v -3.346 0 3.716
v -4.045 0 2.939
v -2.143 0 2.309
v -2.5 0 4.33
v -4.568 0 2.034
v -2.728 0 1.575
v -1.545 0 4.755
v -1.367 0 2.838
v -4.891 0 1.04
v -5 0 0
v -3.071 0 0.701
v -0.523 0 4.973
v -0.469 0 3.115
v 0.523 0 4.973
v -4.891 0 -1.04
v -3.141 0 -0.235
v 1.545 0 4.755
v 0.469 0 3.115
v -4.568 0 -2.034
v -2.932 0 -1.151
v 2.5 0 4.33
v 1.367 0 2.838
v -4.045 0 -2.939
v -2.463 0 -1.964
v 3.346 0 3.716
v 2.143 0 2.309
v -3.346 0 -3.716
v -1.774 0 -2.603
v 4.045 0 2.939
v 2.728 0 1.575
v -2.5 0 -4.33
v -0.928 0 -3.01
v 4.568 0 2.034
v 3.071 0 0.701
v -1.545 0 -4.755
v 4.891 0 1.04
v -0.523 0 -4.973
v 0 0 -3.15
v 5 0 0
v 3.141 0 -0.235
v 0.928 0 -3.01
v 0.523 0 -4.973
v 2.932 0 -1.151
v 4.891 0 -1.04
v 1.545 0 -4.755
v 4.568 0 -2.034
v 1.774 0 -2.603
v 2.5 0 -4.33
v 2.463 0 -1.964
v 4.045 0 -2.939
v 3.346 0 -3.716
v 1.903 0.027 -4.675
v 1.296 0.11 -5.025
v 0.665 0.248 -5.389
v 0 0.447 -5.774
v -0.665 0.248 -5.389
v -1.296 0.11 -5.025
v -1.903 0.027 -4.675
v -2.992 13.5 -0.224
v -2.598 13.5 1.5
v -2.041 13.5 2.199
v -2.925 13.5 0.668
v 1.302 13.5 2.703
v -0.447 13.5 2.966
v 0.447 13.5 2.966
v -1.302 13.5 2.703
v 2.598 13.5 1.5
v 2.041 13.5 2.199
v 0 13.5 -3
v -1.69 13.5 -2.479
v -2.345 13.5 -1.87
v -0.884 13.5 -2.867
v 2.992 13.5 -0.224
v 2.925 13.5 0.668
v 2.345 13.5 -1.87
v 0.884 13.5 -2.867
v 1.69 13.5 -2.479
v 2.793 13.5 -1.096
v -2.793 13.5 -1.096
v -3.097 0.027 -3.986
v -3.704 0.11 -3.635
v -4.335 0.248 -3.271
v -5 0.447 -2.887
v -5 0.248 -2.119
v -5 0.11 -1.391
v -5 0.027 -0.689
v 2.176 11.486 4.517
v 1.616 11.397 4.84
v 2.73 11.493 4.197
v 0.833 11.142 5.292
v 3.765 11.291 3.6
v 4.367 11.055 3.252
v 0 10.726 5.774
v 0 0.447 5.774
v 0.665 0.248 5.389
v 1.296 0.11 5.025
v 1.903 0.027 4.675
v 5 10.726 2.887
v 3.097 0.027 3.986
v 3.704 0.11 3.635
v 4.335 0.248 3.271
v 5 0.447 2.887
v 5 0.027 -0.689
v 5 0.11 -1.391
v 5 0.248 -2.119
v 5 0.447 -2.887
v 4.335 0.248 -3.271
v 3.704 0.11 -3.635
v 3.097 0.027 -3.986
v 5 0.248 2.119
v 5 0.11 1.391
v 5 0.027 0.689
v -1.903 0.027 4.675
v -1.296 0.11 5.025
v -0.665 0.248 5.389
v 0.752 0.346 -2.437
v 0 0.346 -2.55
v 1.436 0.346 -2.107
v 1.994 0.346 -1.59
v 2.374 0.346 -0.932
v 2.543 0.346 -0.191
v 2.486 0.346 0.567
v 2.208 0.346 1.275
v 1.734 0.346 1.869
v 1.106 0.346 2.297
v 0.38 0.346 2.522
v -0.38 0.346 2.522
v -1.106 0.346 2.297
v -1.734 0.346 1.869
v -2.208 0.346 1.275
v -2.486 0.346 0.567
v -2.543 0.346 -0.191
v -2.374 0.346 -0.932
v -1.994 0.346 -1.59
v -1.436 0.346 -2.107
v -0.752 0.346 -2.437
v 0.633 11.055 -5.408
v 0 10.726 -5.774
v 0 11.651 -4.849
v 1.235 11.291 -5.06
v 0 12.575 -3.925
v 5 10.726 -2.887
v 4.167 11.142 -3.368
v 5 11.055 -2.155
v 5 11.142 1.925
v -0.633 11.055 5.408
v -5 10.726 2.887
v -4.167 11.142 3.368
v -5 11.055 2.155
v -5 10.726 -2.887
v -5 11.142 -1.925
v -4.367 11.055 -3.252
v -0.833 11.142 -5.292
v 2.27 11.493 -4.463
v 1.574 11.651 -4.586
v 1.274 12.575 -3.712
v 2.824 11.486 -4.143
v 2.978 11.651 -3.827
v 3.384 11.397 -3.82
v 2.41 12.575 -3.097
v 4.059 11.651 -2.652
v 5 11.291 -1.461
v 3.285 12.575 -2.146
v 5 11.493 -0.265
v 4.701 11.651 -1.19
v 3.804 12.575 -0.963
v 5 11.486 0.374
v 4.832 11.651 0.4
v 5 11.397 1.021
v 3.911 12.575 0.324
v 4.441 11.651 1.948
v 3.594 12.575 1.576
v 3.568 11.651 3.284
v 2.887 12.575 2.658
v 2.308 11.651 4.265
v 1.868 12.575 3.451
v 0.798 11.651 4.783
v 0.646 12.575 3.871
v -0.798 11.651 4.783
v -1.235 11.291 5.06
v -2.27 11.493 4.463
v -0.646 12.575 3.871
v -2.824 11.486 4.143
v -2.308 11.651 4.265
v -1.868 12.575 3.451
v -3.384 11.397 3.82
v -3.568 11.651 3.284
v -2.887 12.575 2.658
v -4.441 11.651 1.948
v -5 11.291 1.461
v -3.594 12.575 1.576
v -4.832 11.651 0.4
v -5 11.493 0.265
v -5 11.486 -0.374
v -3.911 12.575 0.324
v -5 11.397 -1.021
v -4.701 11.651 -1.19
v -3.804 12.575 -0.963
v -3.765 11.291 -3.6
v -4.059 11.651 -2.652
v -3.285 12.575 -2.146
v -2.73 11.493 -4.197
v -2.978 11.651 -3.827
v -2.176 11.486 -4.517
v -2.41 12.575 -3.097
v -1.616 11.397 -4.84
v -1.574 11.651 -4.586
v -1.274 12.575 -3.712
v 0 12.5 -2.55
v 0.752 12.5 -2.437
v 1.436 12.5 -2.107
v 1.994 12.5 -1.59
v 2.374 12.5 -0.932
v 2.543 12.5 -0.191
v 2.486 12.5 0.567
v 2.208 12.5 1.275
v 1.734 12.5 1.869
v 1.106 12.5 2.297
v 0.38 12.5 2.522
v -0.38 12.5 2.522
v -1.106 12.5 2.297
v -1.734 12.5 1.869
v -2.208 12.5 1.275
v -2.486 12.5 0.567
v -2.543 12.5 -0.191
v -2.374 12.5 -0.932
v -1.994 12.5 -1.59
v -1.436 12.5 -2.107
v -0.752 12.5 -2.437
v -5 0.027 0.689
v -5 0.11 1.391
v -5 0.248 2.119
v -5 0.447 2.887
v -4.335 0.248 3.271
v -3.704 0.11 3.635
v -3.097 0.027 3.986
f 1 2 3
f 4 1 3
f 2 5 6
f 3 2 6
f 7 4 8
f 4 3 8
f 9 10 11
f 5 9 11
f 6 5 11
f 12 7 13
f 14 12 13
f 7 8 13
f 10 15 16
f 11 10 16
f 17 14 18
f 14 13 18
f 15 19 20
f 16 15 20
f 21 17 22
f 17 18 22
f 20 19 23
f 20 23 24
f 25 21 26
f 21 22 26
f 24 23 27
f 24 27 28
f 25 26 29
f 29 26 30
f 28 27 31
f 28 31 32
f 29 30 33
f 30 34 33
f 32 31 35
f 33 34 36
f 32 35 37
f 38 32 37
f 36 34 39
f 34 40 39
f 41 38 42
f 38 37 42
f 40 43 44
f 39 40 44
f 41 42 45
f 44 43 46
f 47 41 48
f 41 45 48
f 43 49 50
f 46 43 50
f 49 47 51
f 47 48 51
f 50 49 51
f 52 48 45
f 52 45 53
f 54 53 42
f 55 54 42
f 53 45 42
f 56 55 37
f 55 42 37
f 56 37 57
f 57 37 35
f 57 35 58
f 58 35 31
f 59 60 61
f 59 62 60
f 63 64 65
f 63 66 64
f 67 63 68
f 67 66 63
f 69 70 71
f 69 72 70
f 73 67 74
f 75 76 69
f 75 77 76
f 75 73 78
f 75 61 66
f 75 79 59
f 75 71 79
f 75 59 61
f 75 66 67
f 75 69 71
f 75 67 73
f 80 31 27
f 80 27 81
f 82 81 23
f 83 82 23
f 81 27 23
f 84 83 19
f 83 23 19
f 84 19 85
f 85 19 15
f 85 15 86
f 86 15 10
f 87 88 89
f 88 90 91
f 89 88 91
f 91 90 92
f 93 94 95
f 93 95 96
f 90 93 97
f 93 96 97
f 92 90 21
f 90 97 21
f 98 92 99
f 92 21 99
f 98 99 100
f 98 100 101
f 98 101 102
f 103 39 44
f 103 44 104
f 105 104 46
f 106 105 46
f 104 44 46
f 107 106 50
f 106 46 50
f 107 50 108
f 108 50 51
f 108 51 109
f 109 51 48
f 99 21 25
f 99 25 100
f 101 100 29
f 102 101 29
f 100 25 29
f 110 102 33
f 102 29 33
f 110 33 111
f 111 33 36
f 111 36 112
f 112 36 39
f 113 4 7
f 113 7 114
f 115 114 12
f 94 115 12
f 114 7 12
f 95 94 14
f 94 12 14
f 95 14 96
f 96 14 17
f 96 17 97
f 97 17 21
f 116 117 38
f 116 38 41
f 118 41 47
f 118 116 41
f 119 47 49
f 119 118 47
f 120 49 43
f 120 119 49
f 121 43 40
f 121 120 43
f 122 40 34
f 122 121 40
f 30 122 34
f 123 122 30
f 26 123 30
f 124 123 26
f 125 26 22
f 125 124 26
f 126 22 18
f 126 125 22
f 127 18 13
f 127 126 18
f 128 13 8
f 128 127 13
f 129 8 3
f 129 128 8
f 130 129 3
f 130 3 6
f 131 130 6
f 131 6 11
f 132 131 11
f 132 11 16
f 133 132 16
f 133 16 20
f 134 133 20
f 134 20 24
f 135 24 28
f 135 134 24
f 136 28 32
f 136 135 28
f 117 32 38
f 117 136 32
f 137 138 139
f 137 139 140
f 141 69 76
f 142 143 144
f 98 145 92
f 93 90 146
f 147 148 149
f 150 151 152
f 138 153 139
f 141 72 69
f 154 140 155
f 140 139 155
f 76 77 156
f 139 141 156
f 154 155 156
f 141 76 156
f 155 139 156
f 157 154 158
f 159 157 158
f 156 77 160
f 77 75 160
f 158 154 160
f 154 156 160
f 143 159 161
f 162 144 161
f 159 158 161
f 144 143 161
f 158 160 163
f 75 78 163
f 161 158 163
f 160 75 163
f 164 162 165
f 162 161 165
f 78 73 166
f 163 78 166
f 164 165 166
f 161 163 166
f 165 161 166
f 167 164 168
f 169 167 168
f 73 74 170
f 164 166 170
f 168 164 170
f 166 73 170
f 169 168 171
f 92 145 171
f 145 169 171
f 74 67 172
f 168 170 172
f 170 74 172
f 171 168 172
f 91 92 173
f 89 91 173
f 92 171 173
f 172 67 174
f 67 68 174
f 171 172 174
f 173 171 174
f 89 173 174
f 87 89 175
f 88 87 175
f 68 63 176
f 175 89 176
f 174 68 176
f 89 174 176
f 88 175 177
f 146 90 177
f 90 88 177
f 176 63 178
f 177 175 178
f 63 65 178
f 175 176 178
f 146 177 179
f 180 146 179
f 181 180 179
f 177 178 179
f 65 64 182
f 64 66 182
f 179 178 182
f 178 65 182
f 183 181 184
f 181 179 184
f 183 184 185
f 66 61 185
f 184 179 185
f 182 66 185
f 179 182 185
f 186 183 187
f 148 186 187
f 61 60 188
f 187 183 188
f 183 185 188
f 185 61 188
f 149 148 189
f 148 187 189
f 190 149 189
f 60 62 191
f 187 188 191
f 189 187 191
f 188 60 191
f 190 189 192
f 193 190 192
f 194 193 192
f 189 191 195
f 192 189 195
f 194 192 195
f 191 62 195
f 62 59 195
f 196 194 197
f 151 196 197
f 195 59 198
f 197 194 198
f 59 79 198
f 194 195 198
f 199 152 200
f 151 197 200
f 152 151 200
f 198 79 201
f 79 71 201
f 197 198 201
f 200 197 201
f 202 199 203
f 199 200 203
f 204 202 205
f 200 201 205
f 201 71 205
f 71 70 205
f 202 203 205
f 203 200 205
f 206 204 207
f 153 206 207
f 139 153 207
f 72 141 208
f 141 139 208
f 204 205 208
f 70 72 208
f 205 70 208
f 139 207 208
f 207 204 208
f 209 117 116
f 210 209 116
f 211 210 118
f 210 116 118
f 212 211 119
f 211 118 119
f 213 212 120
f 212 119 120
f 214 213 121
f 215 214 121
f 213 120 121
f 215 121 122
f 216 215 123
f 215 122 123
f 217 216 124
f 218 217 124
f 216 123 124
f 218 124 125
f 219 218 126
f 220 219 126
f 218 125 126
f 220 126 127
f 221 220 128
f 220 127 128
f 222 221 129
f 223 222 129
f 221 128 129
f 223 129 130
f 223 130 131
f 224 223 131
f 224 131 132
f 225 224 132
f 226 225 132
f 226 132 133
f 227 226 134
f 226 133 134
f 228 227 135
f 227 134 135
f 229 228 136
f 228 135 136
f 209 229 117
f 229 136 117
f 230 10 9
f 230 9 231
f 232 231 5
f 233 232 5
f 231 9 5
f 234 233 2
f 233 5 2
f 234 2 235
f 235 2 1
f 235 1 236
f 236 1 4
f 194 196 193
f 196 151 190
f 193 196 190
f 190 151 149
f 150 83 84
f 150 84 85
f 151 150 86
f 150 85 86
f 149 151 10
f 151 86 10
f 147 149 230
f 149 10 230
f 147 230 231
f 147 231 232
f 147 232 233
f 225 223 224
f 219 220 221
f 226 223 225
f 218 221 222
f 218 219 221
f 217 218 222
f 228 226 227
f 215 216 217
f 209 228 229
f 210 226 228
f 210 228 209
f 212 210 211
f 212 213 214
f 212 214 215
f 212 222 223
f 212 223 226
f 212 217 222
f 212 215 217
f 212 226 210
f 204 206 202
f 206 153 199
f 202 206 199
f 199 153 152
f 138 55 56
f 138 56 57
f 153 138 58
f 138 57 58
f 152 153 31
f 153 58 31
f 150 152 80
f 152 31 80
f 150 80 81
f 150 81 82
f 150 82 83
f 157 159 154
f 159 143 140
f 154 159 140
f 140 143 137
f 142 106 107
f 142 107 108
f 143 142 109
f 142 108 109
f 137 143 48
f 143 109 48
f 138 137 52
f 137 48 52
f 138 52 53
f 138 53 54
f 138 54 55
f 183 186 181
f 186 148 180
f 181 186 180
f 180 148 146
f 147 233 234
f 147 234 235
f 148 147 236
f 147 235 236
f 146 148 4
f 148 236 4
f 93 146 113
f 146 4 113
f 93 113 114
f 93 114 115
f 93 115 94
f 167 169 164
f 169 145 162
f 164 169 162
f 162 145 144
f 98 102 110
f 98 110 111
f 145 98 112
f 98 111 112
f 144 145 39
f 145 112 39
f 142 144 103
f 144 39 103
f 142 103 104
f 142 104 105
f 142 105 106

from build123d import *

# Parameters (mm, degrees)
VYSUNOUT1_DEPTH          = 13.5
SKICA4_R                 = 2.55
ODEBRAT_VYSUNUT_M1_DEPTH = 12.5
ZKOSIT1_SIZE             = 0.6
ZKOSIT1_SIZE2            = 0.346410162


with BuildPart() as part:
    # Skica1 → Vysunout1 (new body)
    with BuildSketch(Plane(origin=(0, 0, 0), x_dir=(1, 0, 0), z_dir=(0, 1, 0))):
        Polygon((5, -2.886751346), (5, 2.886751346), (0, 5.773502692), (-5, 2.886751346), (-5, -2.886751346), (0, -5.773502692), align=None)
    extrude(amount=VYSUNOUT1_DEPTH)

    # Skica2 → Odebrat otočením1 (revolve, cut)
    with BuildSketch(Plane(origin=(0, 0, 0), x_dir=(0, 0, -1), z_dir=(1, 0, 0)), mode=Mode.PRIVATE) as odebrat_oto_en_m1_sk:
        Polygon((-5.773502692, 13.5), (-5.773502692, 10.726497308), (-3, 13.5), align=None)
    revolve(odebrat_oto_en_m1_sk.sketch.rotate(Axis((0, 13.5, 0), (0, -1, 0)), 180), axis=Axis((0, 13.5, 0), (0, -1, 0)), mode=Mode.SUBTRACT)

    # Skica3 → Odebrat otočením2 (revolve, cut)
    with BuildSketch(Plane.XY):
        Polygon((5, 0), (28.382685902, 0), (28.382685902, 13.5), align=None)
    revolve(axis=Axis((0, 0, 0), (0, 1, 0)), mode=Mode.SUBTRACT)

    # Skica4 → Odebrat vysunutím1 (cut)
    with BuildSketch(Plane.XZ):
        with Locations(Location((0, 0, 0), (0, 0, 270))):
            Circle(SKICA4_R)
    extrude(amount=-ODEBRAT_VYSUNUT_M1_DEPTH, mode=Mode.SUBTRACT)

    # Zkosit1
    zkosit1_edges = [part.edges().sort_by_distance(p)[0] for p in [
        (0, 0, 2.55),
    ]]
    zkosit1_side = [part.faces().sort_by_distance(p)[0] for p in [
        (4.207652534, 0, 2.429289317),
    ]]
    chamfer(zkosit1_edges, length=ZKOSIT1_SIZE, length2=ZKOSIT1_SIZE2, reference=zkosit1_side[0])


solid = part.part
